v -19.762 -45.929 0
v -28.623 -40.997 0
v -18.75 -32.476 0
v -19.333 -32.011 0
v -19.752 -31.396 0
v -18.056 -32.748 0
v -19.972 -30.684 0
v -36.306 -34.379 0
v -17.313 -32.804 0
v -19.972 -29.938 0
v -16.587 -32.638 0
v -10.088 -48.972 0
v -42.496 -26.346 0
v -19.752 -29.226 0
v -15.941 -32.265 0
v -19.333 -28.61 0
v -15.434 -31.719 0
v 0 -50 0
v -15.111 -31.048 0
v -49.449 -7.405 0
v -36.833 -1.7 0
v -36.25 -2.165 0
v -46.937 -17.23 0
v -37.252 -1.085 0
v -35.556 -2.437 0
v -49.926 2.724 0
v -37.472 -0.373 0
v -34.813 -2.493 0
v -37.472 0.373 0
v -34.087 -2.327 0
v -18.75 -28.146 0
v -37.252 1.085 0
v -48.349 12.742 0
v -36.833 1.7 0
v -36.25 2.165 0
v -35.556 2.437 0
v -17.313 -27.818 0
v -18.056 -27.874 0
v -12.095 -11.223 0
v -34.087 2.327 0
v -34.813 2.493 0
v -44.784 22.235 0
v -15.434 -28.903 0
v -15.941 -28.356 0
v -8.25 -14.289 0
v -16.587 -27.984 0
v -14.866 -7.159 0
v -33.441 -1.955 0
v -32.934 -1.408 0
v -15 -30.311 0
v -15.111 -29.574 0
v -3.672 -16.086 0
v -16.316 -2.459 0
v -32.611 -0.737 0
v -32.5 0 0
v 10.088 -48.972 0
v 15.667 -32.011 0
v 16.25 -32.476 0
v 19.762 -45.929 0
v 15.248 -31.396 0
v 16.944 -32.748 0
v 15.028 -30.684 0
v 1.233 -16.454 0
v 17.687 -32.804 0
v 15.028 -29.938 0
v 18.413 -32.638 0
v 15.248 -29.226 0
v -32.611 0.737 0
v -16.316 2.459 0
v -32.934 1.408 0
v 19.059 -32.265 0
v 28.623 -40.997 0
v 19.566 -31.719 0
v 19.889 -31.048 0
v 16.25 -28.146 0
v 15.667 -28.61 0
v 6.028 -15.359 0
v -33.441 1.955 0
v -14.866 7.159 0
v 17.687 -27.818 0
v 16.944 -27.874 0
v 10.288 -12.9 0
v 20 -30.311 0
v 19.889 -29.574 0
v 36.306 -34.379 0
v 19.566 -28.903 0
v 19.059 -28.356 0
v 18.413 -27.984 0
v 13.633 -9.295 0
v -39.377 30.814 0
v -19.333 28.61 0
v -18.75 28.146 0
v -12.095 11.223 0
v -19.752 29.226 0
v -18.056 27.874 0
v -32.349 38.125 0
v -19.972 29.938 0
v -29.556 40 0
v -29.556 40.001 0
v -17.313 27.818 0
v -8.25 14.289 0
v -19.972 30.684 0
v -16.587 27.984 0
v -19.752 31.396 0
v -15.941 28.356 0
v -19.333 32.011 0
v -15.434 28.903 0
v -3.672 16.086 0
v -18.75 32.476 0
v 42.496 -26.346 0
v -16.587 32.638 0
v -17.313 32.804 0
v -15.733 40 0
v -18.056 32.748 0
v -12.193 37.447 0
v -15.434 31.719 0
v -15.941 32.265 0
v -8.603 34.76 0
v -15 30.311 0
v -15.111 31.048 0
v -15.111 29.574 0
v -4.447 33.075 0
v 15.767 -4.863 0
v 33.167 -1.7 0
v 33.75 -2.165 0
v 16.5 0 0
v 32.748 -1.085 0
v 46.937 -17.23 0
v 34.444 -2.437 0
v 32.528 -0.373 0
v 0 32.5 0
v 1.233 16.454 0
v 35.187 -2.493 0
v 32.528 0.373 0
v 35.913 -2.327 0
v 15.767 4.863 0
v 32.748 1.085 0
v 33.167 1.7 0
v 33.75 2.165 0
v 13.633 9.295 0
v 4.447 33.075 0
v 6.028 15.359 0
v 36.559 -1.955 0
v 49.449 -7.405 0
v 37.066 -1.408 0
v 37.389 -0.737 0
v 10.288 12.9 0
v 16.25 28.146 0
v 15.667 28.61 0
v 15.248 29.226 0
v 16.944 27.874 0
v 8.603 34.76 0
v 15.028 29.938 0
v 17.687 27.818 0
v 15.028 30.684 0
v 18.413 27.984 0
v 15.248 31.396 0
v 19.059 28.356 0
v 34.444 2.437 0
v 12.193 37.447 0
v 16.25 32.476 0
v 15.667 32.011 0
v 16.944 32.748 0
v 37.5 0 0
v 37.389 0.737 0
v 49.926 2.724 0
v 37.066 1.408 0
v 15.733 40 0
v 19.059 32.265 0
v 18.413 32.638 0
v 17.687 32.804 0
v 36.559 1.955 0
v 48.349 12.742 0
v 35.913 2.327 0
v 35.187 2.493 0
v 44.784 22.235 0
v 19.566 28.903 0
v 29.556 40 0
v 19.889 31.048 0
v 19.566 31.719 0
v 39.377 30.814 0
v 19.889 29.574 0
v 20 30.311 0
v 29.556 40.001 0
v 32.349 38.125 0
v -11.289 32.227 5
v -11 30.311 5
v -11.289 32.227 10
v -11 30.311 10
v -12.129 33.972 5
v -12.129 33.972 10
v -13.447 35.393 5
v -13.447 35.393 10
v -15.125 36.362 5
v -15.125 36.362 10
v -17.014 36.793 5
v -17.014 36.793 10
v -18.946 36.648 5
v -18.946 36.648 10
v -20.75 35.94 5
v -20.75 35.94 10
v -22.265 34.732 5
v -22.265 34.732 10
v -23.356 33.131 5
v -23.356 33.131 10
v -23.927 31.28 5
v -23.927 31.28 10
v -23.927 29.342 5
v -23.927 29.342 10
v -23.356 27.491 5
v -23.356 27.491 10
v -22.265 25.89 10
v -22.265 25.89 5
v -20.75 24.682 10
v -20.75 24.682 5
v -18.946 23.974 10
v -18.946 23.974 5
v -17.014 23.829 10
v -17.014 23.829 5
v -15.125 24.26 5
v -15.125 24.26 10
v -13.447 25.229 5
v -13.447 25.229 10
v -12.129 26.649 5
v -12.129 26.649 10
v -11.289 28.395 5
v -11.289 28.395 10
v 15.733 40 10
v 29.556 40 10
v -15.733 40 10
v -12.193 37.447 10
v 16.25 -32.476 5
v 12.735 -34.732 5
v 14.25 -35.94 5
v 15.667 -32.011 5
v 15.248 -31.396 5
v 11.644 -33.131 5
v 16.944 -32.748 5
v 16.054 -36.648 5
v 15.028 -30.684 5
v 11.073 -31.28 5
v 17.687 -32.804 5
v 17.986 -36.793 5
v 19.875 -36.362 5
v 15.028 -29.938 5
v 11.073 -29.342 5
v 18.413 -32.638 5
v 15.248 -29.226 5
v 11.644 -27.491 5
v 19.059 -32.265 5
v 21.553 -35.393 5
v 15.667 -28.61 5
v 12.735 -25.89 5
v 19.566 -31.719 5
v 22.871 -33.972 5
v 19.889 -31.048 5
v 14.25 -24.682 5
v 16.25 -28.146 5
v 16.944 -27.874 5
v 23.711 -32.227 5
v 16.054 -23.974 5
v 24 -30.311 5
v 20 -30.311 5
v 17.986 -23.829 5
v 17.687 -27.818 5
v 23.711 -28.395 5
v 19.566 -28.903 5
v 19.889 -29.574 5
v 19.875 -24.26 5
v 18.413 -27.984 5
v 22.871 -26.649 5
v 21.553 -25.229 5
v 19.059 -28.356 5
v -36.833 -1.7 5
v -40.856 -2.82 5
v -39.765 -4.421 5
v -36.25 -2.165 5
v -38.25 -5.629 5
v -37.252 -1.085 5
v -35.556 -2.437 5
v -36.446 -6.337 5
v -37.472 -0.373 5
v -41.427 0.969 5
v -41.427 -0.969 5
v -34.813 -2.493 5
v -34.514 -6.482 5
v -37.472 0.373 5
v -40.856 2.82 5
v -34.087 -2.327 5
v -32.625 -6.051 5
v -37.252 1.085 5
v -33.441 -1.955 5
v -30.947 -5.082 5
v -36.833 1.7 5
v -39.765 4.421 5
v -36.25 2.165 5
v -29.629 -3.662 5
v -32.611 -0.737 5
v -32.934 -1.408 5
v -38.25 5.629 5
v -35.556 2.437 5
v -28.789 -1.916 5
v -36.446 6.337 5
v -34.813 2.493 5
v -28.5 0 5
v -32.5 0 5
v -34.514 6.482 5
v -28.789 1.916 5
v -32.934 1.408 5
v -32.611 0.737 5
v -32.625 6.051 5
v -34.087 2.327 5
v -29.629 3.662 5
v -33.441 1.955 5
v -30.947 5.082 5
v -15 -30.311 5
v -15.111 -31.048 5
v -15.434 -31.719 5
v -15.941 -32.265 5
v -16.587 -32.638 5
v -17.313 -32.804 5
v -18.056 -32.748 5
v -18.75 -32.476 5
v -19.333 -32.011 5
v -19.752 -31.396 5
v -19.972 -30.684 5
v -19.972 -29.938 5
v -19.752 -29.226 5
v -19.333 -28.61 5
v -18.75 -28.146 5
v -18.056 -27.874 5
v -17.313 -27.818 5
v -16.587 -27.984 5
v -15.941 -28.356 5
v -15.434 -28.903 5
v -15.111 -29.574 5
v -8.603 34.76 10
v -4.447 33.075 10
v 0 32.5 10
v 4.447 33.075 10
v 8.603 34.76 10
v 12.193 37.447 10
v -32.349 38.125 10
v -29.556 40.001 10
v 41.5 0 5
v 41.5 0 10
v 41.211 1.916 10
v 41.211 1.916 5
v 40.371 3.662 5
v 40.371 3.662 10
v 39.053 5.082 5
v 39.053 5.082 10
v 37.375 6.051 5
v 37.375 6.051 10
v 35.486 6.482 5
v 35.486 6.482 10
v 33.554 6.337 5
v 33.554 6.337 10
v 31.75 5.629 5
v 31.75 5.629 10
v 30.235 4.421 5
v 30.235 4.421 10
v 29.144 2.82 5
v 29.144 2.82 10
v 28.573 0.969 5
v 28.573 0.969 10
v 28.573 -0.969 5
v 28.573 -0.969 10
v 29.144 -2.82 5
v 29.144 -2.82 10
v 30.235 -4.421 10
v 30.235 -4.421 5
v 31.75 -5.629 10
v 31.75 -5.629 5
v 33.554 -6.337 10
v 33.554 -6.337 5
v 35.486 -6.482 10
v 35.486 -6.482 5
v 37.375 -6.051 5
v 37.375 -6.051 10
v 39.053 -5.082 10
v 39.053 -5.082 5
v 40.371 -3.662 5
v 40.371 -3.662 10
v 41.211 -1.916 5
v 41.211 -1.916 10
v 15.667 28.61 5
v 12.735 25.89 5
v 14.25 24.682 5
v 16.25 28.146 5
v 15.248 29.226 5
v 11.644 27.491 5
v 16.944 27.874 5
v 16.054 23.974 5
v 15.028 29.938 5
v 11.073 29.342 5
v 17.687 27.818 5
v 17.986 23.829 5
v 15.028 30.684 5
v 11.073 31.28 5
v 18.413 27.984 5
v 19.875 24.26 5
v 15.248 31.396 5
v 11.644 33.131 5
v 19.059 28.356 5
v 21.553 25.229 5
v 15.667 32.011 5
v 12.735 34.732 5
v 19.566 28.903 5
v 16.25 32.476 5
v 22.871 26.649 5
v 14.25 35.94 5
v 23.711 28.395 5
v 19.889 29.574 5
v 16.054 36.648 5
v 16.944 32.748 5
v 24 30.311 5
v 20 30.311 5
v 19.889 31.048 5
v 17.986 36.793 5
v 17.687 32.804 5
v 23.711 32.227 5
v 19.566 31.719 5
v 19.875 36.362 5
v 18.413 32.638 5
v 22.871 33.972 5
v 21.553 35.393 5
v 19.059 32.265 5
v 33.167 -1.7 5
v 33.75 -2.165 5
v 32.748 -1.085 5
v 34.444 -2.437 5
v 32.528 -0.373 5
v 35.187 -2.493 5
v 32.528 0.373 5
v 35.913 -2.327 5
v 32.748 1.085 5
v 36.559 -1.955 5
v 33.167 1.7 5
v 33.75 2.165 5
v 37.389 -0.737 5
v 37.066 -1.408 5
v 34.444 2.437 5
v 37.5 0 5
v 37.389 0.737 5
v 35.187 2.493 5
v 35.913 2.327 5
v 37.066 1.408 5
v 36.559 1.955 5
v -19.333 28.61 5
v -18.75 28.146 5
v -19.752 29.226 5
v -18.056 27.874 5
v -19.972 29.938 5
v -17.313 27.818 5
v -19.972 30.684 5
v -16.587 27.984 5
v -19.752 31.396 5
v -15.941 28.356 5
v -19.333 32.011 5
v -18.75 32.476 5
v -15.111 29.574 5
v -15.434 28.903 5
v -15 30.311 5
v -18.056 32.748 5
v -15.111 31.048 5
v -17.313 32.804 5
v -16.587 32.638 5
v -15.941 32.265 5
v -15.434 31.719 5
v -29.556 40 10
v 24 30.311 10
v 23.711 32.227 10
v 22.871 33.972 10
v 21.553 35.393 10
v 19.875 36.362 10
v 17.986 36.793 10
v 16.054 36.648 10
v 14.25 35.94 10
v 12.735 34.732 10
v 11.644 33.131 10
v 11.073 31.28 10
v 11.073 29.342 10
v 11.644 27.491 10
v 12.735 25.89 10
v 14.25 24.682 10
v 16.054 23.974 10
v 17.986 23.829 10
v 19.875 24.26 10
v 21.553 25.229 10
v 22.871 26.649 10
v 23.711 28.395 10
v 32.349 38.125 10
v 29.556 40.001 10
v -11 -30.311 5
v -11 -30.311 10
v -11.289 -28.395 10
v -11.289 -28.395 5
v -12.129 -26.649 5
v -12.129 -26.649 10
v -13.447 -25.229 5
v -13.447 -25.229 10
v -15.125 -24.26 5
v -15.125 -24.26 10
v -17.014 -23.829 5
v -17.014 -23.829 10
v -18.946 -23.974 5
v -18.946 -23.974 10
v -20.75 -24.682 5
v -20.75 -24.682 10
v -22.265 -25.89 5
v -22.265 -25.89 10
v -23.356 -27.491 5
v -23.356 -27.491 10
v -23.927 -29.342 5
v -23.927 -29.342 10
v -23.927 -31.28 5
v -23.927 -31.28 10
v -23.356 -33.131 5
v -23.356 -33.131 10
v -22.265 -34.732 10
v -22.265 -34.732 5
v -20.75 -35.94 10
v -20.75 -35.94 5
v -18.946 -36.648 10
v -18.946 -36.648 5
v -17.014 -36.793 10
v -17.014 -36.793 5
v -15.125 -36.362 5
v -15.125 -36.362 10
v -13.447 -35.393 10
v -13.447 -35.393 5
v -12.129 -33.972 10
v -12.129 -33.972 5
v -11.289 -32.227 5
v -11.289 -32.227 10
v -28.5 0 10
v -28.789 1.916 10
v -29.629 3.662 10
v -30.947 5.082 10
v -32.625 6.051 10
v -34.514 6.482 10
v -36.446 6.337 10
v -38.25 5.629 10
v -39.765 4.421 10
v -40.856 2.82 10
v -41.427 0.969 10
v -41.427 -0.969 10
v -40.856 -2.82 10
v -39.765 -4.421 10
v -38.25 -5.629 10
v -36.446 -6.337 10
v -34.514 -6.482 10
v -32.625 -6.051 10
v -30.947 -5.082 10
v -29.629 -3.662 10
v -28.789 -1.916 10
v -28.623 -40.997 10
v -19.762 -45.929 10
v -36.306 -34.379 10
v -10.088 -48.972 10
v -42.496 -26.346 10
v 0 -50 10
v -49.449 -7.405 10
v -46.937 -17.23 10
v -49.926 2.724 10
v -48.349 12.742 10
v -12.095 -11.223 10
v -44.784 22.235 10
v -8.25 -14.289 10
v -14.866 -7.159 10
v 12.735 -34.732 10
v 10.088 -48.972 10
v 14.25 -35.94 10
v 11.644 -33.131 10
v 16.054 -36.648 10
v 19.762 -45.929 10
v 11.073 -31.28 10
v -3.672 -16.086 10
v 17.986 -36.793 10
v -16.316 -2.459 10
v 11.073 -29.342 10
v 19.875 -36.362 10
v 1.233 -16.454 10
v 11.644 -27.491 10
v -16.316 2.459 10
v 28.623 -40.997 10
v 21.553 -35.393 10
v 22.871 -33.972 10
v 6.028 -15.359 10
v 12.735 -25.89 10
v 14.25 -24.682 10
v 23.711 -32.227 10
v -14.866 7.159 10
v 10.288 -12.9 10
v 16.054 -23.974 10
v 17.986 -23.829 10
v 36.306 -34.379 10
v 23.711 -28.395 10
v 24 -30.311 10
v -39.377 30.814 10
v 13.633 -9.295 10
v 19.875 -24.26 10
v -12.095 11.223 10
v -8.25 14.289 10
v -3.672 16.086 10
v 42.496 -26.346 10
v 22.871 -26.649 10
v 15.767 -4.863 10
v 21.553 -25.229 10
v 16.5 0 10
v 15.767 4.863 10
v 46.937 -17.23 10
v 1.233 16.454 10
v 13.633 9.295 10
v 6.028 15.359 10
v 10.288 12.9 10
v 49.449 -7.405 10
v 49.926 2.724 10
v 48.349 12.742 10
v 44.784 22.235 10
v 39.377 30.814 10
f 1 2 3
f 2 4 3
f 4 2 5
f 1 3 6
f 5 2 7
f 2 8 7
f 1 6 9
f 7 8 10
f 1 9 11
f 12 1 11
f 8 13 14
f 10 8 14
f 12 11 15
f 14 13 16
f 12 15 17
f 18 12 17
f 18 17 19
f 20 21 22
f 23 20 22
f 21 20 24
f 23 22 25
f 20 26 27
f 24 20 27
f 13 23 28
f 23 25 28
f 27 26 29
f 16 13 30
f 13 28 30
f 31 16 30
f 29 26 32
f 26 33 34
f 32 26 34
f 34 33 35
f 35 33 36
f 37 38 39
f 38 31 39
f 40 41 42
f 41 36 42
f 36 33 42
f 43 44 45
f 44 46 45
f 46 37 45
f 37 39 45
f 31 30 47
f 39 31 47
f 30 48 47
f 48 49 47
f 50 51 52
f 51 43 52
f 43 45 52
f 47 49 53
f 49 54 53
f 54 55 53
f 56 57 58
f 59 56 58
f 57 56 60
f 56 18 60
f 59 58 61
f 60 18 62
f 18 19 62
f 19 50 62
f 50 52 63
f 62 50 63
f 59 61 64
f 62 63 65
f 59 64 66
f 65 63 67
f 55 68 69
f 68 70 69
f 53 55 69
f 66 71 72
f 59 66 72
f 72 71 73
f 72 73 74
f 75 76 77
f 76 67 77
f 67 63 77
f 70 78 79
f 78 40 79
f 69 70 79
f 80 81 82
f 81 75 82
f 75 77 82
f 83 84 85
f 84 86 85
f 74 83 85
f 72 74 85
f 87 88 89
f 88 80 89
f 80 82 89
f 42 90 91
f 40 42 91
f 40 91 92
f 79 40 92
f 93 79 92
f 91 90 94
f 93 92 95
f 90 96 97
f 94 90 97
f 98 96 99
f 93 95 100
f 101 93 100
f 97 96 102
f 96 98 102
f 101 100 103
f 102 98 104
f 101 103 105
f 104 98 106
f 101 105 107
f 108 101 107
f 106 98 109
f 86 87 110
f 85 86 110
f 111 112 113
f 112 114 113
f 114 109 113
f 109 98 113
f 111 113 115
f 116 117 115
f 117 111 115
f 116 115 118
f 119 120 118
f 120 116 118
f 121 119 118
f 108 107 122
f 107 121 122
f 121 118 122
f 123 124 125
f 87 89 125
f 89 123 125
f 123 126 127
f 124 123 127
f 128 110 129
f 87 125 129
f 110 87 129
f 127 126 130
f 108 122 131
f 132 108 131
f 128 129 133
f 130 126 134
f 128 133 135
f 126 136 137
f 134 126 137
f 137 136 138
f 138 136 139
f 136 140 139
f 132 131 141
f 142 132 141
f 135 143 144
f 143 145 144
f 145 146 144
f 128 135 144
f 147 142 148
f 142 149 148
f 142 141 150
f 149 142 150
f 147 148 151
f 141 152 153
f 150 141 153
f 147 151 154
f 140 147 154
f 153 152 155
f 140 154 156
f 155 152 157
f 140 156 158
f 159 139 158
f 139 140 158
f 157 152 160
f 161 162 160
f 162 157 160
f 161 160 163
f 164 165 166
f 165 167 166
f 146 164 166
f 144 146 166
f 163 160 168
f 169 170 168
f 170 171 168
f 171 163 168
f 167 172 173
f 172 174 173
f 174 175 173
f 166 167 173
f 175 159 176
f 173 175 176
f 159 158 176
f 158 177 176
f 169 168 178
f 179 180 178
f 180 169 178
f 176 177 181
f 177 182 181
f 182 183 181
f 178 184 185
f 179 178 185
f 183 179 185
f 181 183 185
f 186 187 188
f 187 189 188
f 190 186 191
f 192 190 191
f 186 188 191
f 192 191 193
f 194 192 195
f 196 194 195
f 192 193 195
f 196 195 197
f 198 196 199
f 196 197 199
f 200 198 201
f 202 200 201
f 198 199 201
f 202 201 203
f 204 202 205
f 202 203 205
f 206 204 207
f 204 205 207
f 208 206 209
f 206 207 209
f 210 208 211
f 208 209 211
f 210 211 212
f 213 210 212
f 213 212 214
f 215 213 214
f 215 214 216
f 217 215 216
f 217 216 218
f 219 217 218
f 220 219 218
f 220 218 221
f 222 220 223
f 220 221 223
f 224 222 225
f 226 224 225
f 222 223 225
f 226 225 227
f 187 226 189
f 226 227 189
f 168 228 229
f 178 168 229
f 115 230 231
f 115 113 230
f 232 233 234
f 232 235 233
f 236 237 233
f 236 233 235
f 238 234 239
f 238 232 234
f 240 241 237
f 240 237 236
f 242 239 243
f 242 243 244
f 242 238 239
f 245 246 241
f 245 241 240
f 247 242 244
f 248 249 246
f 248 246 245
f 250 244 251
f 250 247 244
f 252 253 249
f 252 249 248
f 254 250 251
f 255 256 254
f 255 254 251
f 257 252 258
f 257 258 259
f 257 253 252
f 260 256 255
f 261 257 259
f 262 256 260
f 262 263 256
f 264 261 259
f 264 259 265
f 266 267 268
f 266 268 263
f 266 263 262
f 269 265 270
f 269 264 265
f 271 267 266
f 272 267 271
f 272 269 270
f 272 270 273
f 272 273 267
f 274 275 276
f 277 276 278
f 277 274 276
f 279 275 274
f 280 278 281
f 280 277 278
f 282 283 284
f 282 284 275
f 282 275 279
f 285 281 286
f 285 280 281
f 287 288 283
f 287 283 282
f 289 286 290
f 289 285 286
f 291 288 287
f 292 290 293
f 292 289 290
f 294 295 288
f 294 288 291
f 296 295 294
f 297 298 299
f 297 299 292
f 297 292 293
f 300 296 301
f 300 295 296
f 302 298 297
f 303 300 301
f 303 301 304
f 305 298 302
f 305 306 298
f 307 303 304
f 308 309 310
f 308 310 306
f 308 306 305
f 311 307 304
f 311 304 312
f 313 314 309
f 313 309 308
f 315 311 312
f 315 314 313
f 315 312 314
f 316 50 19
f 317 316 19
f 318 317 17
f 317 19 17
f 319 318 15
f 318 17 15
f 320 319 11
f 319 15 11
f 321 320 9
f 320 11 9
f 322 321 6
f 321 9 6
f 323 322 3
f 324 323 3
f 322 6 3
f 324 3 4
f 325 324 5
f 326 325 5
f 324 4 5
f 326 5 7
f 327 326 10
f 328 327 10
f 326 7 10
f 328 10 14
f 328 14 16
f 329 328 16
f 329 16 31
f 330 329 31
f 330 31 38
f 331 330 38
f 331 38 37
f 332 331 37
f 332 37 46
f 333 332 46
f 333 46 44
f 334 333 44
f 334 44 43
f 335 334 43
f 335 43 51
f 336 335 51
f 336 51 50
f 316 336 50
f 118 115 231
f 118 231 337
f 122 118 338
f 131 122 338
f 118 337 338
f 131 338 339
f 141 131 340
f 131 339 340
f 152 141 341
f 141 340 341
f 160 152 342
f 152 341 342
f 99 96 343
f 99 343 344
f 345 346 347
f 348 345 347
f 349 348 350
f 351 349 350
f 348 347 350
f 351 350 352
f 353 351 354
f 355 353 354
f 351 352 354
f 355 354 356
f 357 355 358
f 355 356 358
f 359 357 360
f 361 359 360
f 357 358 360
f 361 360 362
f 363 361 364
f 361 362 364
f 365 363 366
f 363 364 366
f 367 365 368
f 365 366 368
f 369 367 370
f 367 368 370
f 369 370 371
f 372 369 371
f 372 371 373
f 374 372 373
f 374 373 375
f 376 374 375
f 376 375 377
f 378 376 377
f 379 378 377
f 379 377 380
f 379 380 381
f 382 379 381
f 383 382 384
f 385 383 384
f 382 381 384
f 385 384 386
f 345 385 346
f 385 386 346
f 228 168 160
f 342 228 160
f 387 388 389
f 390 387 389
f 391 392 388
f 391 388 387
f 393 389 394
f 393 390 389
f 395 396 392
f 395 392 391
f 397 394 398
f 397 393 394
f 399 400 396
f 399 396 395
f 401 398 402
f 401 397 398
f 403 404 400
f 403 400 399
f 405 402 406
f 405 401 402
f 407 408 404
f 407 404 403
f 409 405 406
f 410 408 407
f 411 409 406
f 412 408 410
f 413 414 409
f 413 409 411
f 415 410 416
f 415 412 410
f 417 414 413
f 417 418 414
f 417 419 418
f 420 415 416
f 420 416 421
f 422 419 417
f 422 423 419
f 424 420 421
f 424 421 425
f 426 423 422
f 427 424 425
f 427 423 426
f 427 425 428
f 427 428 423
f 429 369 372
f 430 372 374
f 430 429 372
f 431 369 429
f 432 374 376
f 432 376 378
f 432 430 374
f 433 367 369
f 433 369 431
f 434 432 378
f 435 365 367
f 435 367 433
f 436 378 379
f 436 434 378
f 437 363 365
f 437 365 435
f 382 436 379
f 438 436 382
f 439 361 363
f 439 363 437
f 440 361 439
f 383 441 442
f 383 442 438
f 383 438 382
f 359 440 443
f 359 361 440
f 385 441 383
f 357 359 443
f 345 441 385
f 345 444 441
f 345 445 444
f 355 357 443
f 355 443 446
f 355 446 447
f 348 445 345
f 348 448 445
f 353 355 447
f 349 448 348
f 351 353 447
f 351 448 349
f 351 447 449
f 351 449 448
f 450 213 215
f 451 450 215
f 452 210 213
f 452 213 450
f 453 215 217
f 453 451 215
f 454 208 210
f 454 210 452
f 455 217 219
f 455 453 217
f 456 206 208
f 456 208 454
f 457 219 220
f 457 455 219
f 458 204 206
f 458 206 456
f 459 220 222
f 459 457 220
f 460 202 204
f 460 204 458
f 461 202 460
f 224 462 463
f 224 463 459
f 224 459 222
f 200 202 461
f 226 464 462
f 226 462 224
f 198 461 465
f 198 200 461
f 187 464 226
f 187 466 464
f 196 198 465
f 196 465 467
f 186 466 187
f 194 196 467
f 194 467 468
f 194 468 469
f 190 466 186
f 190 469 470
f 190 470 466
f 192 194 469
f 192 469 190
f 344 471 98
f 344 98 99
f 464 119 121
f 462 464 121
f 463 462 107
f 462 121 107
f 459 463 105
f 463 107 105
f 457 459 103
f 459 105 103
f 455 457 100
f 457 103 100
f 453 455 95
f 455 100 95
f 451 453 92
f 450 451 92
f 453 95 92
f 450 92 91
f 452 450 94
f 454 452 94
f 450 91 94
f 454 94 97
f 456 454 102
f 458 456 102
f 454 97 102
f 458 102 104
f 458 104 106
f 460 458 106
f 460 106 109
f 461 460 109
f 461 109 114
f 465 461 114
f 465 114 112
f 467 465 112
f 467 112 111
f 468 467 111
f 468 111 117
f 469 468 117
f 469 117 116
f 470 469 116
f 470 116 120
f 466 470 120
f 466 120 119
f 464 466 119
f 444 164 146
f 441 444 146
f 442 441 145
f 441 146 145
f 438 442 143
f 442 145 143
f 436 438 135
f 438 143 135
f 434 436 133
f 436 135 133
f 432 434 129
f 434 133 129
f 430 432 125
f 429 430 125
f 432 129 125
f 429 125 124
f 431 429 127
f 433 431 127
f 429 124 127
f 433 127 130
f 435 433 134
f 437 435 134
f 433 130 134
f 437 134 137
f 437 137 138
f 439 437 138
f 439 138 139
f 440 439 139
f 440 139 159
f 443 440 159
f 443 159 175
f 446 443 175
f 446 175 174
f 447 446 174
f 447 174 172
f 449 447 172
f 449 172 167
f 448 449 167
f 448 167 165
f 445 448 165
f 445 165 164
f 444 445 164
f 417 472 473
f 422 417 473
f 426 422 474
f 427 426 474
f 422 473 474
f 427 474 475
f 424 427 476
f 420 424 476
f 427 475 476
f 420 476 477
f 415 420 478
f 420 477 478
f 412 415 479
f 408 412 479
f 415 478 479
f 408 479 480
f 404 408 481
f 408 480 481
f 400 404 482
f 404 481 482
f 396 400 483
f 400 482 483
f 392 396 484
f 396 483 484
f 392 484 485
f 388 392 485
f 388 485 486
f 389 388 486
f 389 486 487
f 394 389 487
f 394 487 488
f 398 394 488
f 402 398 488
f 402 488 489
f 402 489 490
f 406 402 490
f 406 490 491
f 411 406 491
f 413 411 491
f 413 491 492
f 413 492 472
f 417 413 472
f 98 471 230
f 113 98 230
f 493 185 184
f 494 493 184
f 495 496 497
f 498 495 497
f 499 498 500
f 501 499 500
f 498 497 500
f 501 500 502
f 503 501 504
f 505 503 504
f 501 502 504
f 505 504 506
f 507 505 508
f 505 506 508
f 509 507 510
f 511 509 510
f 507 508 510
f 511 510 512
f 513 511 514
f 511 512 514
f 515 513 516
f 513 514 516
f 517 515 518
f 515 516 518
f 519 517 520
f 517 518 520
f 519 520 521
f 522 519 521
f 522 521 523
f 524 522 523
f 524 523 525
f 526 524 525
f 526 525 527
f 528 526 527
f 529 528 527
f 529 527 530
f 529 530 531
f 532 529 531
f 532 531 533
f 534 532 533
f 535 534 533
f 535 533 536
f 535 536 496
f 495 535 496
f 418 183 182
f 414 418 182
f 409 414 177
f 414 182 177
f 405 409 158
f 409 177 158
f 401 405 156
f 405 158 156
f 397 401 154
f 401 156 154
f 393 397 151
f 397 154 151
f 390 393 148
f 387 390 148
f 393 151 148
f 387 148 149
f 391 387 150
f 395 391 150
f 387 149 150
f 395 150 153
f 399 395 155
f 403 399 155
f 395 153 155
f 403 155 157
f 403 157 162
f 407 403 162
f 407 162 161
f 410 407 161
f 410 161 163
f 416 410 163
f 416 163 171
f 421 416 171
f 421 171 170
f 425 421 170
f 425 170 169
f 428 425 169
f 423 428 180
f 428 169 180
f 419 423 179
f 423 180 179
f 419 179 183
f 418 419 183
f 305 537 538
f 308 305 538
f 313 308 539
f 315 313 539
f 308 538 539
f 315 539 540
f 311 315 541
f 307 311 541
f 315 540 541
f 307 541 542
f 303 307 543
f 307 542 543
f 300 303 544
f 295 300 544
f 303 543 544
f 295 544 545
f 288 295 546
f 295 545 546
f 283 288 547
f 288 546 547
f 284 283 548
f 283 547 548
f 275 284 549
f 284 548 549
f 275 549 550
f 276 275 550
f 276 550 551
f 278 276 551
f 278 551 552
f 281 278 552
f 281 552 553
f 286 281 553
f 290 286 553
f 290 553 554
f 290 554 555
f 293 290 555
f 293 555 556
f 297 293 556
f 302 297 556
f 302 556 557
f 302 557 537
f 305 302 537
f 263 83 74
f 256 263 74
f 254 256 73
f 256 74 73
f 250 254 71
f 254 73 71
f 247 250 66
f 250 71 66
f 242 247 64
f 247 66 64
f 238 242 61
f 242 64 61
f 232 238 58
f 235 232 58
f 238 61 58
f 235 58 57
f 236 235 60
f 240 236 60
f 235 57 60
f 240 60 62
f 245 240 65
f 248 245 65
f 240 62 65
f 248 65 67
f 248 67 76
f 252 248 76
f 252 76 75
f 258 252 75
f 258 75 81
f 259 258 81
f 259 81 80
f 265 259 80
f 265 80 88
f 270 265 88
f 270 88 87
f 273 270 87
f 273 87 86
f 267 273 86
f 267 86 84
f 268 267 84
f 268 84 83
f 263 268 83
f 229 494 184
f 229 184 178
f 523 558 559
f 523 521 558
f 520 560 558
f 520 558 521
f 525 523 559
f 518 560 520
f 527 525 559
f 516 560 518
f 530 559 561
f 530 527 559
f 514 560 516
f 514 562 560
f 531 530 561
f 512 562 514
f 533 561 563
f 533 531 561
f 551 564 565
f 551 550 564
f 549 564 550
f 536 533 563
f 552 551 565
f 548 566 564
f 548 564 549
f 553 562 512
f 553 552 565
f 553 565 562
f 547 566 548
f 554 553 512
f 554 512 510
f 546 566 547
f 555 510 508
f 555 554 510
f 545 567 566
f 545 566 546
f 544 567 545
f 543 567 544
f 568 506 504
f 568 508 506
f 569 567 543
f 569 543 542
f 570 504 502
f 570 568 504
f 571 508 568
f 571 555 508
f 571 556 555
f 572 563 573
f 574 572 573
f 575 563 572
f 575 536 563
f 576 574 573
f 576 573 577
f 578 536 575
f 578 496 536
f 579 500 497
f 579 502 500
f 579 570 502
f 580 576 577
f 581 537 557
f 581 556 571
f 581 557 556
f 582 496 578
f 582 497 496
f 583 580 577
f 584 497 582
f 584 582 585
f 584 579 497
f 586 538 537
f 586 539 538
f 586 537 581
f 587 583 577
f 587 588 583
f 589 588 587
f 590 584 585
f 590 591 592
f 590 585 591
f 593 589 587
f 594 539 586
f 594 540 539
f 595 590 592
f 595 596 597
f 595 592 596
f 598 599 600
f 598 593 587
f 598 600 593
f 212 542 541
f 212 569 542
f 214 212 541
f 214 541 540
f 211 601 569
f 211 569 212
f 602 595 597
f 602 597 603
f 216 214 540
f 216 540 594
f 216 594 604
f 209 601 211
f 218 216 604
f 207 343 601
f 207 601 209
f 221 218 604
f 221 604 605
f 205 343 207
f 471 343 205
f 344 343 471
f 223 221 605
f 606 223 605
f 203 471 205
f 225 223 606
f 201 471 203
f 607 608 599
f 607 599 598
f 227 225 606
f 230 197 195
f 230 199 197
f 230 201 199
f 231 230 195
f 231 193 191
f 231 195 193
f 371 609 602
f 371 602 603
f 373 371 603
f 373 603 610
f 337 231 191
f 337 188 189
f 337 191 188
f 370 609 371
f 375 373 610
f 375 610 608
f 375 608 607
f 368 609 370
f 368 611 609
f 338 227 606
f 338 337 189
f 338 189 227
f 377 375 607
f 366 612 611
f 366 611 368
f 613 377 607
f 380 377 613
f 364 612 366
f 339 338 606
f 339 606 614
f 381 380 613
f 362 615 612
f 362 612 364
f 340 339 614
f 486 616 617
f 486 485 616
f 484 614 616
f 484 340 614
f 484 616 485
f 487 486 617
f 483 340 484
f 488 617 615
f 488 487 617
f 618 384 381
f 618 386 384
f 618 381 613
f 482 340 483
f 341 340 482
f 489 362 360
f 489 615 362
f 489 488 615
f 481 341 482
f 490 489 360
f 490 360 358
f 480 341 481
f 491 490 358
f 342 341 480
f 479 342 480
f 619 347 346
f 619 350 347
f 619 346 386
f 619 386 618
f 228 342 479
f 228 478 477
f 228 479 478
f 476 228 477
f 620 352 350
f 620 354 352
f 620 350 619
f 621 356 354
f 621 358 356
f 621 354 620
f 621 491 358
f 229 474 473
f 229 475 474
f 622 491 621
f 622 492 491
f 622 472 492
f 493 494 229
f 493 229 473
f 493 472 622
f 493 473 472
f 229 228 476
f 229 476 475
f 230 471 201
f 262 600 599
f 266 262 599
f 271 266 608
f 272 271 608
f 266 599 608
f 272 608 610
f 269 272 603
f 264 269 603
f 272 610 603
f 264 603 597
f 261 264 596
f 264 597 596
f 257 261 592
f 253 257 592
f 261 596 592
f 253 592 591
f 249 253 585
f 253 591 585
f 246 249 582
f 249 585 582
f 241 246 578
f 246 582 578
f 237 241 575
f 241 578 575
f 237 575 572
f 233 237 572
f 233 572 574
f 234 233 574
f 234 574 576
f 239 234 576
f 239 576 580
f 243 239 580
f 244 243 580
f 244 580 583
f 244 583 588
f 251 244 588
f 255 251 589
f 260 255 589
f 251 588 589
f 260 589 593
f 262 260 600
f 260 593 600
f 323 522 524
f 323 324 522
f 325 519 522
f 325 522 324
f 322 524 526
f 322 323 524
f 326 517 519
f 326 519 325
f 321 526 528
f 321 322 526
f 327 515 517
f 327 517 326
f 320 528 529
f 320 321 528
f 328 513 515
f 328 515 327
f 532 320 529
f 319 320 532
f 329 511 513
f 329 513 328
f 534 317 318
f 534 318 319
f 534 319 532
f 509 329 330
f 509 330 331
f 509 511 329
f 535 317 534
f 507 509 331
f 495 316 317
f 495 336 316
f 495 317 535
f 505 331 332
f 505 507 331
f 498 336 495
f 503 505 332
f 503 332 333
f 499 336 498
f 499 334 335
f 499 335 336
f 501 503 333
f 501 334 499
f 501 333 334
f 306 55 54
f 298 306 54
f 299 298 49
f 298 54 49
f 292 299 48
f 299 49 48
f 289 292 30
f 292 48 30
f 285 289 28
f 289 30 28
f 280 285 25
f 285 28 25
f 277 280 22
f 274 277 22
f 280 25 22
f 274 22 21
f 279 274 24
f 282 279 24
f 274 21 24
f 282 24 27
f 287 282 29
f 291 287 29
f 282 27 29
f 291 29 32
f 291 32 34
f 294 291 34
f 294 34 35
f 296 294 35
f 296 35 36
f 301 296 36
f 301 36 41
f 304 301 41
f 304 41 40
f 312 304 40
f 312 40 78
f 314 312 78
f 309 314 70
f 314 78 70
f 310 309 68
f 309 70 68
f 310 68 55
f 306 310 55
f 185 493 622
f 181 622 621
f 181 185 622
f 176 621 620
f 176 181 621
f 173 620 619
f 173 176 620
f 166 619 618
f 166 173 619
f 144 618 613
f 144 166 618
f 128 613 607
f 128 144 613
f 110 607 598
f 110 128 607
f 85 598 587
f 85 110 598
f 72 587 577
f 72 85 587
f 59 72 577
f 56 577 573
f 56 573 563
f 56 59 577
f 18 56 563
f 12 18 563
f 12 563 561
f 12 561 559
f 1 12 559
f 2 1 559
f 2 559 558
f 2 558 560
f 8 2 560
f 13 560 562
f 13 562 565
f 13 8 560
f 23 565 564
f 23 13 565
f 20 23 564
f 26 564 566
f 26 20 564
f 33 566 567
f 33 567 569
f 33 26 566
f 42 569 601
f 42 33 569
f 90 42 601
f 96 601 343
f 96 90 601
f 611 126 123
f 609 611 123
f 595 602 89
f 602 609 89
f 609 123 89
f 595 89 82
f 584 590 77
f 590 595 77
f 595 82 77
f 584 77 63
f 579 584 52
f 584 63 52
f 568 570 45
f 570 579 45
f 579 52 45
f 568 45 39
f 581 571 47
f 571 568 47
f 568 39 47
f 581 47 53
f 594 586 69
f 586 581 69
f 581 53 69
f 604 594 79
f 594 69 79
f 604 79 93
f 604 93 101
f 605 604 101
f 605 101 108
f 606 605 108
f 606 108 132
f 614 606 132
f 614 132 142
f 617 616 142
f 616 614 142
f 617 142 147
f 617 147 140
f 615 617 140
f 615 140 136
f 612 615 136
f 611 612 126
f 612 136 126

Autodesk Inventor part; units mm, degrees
ref_plane "YZ Plane" through (0, 0, 0) normal (1, 0, 0) x (0, 1, 0)
ref_plane "XZ Plane" through (0, 0, 0) normal (0, 1, 0) x (-1, 0, 0)
ref_plane "XY Plane" through (0, 0, 0) normal (0, 0, 1) x (1, 0, 0)
sketch "Sketch1" plane through (0, 0, 0) normal (0, 0, 1) x (1, 0, 0)
  circle A0 centre (0, 0) radius 50
  circle A1 centre (0, 0) radius 16.5
  circle A2 centre (35, 0) radius 2.5
  circle A3 centre (17.5, 30.3109) radius 2.5
  circle A4 centre (-17.5, 30.3109) radius 2.5
  circle A5 centre (-35, 0) radius 2.5
  circle A6 centre (-17.5, -30.3109) radius 2.5
  circle A7 centre (17.5, -30.3109) radius 2.5
  dimension "d0" = 100
  dimension "d1" = 33
  dimension "d2" = 5
  dimension "d3" = 35
  dimension "d6" = 360
extrude "Extrusion1" add sketch "Sketch1" along normal blind 10
sketch "Sketch2" plane through (0, 0, 10) normal (0, 0, 1) x (1, 0, 0)
  circle A0 centre (35, 0) radius 2.5 projected
  circle A1 centre (35, 0) radius 6.5
  circle A2 centre (17.5, 30.3109) radius 6.5
  circle A3 centre (-17.5, 30.3109) radius 6.5
  circle A4 centre (-35, 0) radius 6.5
  circle A5 centre (-17.5, -30.3109) radius 6.5
  circle A6 centre (17.5, -30.3109) radius 6.5
  point P0 (0, 0)
  dimension "d10" = 13
  dimension "d13" = 360
extrude "Extrusion2" cut sketch "Sketch2" against normal blind 5 contours A0 | A1 | A2 | A3 | A4 | A5 | A6
sketch "Sketch3" plane through (0, 0, 10) normal (0, 0, 1) x (1, 0, 0)
  circle A0 centre (0, 0) radius 50 construction
  circle A1 centre (0, 50) radius 17.5
  dimension "d17" = 35
extrude "Extrusion3" cut sketch "Sketch3" against normal through all
fillet "Fillet1" radius 15 2 edges at (-17.2299, 46.9375, 5) (17.2299, 46.9375, 5)
sketch "Sketch4" plane through (0, 0, 10) normal (0, 0, 1) x (1, 0, 0)
  line L0 (-29.5557, 40.0005) -> (29.5557, 40.0005)
  arc A0 (-12.1932, 37.4471) -> (-32.3494, 38.125) centre (-22.6446, 26.6875) ccw construction
  arc A1 (32.3494, 38.125) -> (12.1932, 37.4471) centre (22.6446, 26.6875) ccw construction
  line L1 (-29.5557, 40.0005) -> (-29.5557, 42.0005)
  line L2 (-29.5557, 42.0005) -> (29.5557, 42.0005)
  line L3 (29.5557, 42.0005) -> (29.5557, 40.0005)
  point P0 (0, 0)
  dimension "d21" = 13.313
  dimension "d24" = 2
extrude "Extrusion4" cut sketch "Sketch4" against normal through all
properties part number "AA033" material "ABS Plastic"
